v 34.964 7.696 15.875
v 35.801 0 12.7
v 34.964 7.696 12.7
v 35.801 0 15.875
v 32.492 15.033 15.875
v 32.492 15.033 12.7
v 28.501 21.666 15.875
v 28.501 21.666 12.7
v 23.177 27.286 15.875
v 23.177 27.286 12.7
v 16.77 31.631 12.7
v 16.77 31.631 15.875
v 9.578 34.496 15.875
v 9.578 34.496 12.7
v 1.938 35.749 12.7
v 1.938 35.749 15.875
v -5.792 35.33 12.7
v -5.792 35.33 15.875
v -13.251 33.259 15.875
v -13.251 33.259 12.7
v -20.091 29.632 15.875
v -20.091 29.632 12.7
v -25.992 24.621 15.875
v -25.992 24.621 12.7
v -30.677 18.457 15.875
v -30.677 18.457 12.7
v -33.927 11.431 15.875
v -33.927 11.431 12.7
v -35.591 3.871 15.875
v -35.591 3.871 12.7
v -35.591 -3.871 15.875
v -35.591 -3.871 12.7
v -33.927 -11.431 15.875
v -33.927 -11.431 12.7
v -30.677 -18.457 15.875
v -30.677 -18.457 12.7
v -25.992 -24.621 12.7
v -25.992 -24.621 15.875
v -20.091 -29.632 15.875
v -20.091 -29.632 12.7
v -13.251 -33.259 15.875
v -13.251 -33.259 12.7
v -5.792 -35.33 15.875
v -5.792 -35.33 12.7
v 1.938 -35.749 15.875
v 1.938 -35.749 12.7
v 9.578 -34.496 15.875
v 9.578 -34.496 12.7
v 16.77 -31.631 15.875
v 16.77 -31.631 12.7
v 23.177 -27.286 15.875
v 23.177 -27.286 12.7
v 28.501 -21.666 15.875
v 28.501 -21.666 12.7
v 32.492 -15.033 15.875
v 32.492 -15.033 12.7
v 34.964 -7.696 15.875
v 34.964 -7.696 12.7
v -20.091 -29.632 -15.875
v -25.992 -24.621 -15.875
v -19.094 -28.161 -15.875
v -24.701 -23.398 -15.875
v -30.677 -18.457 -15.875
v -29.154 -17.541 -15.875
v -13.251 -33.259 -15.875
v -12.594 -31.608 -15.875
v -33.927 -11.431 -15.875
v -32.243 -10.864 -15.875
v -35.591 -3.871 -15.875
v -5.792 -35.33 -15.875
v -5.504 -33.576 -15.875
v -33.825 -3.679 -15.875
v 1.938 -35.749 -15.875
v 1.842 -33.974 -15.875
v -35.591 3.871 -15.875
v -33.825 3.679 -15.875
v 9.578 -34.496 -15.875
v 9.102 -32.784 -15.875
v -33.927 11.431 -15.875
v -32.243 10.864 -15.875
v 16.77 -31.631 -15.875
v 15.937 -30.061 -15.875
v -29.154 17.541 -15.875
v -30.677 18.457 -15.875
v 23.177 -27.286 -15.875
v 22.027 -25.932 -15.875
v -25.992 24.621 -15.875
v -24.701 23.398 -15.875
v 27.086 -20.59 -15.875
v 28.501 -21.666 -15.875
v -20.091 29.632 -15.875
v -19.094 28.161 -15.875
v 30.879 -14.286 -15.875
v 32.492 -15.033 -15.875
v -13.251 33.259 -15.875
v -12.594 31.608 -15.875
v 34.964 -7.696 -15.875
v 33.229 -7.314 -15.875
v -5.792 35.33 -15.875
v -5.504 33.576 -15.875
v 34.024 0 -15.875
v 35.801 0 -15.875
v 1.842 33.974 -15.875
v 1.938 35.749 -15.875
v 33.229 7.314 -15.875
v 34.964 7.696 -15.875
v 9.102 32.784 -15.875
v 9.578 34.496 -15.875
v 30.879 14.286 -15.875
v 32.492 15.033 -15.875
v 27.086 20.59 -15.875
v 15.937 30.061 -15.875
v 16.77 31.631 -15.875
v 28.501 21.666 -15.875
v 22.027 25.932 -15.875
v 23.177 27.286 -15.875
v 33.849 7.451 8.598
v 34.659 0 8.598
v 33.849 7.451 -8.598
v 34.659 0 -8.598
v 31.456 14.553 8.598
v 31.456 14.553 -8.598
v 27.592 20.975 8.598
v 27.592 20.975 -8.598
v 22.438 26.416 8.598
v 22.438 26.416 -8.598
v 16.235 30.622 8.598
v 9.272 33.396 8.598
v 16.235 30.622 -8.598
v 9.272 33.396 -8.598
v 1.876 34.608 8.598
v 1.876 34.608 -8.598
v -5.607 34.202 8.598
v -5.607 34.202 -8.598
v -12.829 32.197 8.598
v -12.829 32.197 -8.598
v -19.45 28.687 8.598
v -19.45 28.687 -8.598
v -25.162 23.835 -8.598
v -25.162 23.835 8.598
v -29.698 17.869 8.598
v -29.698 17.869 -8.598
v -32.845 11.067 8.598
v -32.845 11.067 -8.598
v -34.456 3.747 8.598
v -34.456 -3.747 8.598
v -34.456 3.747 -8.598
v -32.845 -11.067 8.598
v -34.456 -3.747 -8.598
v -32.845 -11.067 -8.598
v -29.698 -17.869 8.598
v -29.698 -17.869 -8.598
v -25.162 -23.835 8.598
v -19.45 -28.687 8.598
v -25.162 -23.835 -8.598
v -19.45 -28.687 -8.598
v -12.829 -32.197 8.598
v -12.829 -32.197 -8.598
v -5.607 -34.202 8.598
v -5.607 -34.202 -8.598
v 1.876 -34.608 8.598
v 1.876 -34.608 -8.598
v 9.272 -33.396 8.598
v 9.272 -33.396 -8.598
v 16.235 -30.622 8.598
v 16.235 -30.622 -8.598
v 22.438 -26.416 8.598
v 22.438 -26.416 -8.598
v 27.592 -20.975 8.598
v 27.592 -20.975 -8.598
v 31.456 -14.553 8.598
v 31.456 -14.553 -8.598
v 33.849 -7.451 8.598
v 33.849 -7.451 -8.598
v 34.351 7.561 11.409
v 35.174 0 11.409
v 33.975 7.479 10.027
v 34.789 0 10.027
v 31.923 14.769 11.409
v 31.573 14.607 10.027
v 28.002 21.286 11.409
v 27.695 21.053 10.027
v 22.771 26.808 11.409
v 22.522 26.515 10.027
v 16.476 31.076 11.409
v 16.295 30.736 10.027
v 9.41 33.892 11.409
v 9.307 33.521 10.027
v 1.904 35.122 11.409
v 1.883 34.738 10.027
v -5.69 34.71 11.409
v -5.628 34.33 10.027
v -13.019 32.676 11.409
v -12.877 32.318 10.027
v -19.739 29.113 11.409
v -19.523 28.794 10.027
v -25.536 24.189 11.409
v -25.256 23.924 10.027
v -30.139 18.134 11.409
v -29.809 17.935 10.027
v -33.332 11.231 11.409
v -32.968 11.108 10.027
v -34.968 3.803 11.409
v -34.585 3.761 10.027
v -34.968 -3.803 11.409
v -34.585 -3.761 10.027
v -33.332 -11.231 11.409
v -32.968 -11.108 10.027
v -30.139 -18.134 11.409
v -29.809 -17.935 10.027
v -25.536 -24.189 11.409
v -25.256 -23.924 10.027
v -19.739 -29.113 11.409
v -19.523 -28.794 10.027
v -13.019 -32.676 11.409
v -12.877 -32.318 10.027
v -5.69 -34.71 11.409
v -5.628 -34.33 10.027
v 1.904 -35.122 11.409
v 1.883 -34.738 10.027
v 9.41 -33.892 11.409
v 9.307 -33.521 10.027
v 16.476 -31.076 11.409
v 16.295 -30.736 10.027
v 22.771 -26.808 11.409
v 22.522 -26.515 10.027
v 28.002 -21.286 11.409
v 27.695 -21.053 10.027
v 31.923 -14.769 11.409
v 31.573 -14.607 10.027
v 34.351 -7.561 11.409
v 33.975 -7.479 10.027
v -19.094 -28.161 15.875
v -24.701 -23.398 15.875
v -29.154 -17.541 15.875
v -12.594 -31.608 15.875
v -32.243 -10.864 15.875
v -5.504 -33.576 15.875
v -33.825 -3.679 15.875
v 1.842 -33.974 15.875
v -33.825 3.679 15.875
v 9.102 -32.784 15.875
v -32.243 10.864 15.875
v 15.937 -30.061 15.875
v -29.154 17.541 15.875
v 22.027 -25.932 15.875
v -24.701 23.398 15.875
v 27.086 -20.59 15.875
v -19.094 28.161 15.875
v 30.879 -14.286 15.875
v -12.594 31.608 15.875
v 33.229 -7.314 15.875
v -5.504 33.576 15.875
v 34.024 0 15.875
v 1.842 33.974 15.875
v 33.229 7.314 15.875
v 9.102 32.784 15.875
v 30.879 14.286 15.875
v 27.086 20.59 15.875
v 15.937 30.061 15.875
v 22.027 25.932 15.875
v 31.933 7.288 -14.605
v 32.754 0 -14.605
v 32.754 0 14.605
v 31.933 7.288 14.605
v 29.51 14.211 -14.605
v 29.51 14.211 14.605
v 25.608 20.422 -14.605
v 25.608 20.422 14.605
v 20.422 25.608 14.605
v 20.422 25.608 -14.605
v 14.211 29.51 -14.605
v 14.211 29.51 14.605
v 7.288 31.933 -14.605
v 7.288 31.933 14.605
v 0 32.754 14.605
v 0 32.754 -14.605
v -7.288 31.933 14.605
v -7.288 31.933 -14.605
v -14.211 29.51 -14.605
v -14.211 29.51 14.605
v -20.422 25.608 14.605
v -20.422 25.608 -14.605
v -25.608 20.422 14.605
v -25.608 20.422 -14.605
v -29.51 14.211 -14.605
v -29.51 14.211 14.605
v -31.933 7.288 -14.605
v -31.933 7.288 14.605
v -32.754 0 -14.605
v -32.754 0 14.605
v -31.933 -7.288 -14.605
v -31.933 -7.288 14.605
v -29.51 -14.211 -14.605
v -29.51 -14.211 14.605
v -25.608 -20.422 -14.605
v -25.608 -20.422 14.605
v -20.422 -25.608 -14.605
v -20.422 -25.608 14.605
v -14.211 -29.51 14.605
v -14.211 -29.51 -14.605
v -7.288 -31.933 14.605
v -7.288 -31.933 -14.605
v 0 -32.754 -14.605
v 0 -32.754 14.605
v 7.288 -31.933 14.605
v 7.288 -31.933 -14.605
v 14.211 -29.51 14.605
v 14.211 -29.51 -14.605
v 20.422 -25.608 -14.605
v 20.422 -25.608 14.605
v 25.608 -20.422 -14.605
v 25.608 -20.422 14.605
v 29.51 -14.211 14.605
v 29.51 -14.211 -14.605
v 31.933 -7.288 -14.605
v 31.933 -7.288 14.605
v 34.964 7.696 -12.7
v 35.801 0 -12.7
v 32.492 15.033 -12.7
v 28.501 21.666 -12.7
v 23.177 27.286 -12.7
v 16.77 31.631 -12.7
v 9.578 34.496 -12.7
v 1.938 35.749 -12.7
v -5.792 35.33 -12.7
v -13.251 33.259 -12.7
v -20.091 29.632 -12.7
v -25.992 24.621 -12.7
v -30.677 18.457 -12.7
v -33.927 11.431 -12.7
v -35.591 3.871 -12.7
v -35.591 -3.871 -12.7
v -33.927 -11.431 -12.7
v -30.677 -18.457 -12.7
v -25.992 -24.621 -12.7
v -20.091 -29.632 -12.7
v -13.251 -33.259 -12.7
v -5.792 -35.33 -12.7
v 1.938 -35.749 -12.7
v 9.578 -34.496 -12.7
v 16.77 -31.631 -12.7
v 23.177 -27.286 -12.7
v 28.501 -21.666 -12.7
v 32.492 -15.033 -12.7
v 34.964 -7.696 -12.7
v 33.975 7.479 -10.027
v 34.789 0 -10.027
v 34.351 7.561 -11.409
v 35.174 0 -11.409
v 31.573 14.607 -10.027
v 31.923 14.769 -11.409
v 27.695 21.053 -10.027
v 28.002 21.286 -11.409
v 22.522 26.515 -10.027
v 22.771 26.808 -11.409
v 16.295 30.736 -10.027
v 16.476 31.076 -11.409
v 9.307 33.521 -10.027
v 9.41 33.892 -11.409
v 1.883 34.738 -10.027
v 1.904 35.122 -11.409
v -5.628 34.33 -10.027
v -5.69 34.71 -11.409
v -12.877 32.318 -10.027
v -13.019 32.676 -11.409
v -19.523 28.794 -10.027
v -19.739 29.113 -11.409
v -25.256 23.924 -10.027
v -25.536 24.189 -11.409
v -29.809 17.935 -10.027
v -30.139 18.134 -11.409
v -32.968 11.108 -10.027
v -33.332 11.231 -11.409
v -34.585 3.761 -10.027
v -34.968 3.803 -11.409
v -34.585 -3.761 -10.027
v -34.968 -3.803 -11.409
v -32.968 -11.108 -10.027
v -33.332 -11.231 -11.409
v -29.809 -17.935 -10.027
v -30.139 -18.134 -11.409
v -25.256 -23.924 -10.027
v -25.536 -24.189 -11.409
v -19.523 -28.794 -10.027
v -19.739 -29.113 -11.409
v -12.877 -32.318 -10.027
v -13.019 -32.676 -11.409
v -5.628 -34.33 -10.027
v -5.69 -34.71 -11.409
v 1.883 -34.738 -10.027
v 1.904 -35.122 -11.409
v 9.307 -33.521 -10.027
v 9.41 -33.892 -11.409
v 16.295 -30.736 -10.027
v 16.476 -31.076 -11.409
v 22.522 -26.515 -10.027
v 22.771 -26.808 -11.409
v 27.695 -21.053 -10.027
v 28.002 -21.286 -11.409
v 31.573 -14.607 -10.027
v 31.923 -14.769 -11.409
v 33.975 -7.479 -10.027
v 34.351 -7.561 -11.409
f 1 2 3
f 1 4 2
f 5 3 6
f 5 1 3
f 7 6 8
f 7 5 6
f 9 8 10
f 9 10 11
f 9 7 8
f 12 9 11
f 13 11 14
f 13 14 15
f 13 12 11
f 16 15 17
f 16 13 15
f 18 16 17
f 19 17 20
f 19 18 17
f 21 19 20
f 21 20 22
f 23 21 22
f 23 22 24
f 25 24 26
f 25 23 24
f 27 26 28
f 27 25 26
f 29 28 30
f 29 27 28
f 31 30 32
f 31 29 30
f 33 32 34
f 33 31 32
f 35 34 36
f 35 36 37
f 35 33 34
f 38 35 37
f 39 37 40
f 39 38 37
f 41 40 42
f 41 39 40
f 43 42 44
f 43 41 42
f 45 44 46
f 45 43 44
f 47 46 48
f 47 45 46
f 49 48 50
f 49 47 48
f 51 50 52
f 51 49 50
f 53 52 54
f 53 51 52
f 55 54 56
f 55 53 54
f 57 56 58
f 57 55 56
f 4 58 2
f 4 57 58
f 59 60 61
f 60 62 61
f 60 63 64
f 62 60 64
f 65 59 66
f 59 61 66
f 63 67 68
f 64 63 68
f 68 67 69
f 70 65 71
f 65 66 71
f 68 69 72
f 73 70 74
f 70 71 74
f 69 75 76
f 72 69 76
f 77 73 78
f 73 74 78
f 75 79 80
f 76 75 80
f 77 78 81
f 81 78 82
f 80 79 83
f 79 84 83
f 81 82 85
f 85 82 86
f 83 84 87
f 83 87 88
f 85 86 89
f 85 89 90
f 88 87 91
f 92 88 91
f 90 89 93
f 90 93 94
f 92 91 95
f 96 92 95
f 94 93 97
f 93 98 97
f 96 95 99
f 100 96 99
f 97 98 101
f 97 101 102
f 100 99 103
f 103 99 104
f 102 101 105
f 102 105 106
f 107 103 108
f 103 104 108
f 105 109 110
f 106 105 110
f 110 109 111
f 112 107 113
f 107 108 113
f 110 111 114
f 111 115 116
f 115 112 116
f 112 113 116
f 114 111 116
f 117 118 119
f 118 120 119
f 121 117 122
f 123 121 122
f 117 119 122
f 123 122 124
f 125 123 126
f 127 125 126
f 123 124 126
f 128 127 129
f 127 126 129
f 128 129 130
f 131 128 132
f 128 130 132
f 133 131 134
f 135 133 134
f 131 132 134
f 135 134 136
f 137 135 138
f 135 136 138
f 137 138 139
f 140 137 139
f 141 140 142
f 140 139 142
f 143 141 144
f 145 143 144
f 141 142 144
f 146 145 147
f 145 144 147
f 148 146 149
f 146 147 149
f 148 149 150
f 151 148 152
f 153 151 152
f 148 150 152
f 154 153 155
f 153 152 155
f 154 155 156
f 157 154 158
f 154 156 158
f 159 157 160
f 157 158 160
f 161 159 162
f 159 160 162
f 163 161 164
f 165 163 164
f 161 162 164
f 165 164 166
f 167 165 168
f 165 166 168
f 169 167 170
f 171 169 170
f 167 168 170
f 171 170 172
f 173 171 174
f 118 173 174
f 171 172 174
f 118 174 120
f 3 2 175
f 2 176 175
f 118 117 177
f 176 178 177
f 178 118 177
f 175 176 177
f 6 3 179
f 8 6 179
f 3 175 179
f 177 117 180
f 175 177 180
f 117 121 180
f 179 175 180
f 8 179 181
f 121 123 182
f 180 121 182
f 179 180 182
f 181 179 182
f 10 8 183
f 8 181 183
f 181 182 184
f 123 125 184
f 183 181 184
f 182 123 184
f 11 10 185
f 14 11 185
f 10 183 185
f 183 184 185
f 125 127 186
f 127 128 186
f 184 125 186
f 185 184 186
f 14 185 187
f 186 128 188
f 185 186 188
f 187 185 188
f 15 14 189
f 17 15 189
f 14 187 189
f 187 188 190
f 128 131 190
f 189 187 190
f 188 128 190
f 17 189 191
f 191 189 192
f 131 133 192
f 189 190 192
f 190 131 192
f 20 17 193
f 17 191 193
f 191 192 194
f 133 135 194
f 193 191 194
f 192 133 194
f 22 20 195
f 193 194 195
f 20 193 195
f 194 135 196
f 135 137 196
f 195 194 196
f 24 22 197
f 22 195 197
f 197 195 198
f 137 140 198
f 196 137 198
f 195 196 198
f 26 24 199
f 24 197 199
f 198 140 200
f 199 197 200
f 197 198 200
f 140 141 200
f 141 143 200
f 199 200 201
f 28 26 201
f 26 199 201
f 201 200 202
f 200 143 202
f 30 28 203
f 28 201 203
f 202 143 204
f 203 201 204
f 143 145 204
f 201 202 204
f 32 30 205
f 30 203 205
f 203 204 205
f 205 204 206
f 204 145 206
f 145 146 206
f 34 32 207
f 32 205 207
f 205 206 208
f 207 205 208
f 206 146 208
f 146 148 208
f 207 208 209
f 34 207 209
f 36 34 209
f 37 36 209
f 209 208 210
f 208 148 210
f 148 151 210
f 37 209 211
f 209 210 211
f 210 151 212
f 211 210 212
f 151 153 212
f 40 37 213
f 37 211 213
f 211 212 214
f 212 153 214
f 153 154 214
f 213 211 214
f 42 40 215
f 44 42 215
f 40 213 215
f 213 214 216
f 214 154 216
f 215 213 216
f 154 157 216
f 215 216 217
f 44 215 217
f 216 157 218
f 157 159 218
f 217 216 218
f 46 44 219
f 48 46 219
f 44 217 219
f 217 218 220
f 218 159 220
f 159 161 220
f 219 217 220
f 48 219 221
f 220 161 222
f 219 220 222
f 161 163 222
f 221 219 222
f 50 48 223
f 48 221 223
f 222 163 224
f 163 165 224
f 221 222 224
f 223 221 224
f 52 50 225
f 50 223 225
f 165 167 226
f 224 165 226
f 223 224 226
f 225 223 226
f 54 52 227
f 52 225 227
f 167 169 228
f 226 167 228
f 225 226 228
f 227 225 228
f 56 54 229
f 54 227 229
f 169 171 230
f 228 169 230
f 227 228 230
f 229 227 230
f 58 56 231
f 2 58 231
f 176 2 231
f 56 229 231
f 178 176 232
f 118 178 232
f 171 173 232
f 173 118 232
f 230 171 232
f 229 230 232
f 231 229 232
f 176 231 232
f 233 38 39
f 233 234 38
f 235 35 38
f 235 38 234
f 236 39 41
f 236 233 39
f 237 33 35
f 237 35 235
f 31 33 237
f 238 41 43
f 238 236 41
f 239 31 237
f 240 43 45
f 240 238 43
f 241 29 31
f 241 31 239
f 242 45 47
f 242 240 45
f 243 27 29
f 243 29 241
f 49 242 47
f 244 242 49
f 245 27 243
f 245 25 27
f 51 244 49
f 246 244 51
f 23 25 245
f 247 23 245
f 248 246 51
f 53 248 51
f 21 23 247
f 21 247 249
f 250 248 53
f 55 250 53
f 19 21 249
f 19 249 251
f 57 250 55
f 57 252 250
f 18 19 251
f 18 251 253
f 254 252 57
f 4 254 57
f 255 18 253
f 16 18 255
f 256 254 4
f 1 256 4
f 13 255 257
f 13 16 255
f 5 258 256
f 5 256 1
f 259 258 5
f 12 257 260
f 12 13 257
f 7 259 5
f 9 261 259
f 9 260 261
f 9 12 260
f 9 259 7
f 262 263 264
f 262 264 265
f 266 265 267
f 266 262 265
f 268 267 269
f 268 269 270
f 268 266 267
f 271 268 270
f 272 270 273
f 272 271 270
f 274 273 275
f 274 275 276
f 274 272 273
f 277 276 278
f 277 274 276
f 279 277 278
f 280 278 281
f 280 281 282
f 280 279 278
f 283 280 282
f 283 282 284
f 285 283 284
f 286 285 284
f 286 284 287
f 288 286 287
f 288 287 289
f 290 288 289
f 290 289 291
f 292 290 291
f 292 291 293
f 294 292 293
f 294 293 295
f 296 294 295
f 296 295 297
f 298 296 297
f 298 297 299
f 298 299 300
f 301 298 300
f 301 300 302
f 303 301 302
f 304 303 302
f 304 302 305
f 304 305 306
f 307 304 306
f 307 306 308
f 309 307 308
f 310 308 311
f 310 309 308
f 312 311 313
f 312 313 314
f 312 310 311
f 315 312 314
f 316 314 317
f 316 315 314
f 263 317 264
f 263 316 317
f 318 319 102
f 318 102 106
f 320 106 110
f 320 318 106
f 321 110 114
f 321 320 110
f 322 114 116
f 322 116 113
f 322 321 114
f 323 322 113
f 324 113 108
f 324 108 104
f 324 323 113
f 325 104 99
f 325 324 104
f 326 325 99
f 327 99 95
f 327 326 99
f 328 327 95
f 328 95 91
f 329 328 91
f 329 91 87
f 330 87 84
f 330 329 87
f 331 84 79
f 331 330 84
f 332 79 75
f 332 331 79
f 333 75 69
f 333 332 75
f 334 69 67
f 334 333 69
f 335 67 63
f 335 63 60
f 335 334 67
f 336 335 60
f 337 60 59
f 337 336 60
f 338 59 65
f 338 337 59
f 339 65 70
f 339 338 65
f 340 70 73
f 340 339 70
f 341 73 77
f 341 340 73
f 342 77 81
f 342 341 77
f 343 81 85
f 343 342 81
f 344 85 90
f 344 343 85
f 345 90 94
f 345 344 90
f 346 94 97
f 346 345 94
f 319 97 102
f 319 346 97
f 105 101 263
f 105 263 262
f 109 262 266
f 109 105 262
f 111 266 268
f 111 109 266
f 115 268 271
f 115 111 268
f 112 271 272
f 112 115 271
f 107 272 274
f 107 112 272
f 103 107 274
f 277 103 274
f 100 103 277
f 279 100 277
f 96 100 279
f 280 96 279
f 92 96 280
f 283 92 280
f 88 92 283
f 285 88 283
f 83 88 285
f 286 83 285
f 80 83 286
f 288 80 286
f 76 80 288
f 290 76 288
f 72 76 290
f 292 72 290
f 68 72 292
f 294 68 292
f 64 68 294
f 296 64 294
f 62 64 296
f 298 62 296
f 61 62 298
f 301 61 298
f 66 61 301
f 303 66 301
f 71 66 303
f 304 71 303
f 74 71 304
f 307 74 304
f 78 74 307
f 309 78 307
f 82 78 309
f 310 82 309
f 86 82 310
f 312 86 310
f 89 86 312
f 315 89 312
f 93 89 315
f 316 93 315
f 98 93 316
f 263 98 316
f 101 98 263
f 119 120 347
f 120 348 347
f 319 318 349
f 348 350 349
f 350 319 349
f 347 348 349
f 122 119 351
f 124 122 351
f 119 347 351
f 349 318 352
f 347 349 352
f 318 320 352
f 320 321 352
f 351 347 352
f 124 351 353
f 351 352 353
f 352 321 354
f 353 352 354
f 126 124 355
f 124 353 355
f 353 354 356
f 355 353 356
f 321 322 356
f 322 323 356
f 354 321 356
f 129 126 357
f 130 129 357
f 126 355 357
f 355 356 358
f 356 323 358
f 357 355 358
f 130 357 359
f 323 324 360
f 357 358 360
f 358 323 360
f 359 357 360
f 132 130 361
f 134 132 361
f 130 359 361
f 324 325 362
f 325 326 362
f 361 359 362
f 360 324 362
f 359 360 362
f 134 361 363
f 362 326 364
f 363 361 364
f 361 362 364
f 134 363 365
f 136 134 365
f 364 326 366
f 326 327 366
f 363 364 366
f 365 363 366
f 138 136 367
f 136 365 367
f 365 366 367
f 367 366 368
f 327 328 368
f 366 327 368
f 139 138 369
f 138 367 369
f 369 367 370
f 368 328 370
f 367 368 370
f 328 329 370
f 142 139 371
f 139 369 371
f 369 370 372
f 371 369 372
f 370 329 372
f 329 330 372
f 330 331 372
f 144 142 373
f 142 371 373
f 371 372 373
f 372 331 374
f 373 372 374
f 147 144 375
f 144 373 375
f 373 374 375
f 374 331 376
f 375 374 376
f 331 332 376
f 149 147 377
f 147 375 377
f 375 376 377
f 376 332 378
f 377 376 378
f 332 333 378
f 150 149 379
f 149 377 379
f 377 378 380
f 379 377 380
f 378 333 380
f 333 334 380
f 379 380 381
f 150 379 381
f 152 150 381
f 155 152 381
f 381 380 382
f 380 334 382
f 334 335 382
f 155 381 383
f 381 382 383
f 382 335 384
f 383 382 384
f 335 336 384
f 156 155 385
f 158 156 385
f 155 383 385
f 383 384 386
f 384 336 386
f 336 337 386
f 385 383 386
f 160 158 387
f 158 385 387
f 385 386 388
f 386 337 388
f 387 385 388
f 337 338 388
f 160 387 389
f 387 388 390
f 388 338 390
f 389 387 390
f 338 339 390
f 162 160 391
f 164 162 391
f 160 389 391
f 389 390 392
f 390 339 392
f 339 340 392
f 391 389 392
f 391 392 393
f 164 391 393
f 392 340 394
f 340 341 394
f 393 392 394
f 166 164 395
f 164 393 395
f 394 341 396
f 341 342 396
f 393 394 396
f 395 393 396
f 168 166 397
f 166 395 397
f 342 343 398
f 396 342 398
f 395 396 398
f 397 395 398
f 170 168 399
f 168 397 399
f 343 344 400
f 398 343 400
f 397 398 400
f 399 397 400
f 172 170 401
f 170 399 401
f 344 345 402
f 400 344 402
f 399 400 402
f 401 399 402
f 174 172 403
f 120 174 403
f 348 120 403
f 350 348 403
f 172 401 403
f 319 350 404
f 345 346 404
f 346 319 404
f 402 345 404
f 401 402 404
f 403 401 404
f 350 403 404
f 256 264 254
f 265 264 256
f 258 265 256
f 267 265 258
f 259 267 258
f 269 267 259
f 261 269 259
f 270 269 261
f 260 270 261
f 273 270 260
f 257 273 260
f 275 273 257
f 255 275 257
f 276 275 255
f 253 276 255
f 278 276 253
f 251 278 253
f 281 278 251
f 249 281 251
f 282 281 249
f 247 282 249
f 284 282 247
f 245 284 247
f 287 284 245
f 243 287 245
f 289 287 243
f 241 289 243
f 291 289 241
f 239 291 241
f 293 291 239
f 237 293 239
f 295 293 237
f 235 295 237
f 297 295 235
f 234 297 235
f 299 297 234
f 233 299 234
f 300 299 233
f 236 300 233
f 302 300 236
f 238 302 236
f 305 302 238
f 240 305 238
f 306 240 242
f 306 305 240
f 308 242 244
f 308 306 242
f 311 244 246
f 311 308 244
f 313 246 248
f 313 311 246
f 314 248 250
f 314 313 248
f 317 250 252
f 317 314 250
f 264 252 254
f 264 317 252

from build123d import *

# Parameters (mm, degrees)
SKETCH1_R           = 35.8013
SKETCH1_R_2         = 32.754
BOSS_EXTRUDE1_DEPTH = 15.875
CHAMFER1_SIZE       = 1.27


with BuildPart() as part:
    # Sketch1 → Boss-Extrude1 (new body, symmetric)
    with BuildSketch(Plane.XY):
        Circle(SKETCH1_R)
        Circle(SKETCH1_R_2, mode=Mode.SUBTRACT)
    extrude(amount=BOSS_EXTRUDE1_DEPTH, both=True)

    # Chamfer1
    chamfer1_edges = [part.edges().sort_by_distance(p)[0] for p in [
        (-32.754, 0, -15.875),
        (-32.754, 0, 15.875),
    ]]
    chamfer(chamfer1_edges, length=CHAMFER1_SIZE)

    # Sketch6 → Cut-Revolve2 (revolve, cut)
    with BuildSketch(Plane(origin=(0, 0, 0), x_dir=(1, 0, 0), z_dir=(0, 1, 0))):
        with BuildLine():
            Line((34.659, -8.597663689), (34.659, 8.597663689))
            ThreePointArc((34.659, 8.597663689), (34.949905783, 10.726866151), (35.8013, 12.7))
            Line((35.8013, 12.7), (35.8013, -12.7))
            ThreePointArc((35.8013, -12.7), (34.949905783, -10.726866151), (34.659, -8.597663689))
        make_face()
    revolve(axis=Axis((0, 0, -15.875), (0, 0, 1)), mode=Mode.SUBTRACT)


solid = part.part
